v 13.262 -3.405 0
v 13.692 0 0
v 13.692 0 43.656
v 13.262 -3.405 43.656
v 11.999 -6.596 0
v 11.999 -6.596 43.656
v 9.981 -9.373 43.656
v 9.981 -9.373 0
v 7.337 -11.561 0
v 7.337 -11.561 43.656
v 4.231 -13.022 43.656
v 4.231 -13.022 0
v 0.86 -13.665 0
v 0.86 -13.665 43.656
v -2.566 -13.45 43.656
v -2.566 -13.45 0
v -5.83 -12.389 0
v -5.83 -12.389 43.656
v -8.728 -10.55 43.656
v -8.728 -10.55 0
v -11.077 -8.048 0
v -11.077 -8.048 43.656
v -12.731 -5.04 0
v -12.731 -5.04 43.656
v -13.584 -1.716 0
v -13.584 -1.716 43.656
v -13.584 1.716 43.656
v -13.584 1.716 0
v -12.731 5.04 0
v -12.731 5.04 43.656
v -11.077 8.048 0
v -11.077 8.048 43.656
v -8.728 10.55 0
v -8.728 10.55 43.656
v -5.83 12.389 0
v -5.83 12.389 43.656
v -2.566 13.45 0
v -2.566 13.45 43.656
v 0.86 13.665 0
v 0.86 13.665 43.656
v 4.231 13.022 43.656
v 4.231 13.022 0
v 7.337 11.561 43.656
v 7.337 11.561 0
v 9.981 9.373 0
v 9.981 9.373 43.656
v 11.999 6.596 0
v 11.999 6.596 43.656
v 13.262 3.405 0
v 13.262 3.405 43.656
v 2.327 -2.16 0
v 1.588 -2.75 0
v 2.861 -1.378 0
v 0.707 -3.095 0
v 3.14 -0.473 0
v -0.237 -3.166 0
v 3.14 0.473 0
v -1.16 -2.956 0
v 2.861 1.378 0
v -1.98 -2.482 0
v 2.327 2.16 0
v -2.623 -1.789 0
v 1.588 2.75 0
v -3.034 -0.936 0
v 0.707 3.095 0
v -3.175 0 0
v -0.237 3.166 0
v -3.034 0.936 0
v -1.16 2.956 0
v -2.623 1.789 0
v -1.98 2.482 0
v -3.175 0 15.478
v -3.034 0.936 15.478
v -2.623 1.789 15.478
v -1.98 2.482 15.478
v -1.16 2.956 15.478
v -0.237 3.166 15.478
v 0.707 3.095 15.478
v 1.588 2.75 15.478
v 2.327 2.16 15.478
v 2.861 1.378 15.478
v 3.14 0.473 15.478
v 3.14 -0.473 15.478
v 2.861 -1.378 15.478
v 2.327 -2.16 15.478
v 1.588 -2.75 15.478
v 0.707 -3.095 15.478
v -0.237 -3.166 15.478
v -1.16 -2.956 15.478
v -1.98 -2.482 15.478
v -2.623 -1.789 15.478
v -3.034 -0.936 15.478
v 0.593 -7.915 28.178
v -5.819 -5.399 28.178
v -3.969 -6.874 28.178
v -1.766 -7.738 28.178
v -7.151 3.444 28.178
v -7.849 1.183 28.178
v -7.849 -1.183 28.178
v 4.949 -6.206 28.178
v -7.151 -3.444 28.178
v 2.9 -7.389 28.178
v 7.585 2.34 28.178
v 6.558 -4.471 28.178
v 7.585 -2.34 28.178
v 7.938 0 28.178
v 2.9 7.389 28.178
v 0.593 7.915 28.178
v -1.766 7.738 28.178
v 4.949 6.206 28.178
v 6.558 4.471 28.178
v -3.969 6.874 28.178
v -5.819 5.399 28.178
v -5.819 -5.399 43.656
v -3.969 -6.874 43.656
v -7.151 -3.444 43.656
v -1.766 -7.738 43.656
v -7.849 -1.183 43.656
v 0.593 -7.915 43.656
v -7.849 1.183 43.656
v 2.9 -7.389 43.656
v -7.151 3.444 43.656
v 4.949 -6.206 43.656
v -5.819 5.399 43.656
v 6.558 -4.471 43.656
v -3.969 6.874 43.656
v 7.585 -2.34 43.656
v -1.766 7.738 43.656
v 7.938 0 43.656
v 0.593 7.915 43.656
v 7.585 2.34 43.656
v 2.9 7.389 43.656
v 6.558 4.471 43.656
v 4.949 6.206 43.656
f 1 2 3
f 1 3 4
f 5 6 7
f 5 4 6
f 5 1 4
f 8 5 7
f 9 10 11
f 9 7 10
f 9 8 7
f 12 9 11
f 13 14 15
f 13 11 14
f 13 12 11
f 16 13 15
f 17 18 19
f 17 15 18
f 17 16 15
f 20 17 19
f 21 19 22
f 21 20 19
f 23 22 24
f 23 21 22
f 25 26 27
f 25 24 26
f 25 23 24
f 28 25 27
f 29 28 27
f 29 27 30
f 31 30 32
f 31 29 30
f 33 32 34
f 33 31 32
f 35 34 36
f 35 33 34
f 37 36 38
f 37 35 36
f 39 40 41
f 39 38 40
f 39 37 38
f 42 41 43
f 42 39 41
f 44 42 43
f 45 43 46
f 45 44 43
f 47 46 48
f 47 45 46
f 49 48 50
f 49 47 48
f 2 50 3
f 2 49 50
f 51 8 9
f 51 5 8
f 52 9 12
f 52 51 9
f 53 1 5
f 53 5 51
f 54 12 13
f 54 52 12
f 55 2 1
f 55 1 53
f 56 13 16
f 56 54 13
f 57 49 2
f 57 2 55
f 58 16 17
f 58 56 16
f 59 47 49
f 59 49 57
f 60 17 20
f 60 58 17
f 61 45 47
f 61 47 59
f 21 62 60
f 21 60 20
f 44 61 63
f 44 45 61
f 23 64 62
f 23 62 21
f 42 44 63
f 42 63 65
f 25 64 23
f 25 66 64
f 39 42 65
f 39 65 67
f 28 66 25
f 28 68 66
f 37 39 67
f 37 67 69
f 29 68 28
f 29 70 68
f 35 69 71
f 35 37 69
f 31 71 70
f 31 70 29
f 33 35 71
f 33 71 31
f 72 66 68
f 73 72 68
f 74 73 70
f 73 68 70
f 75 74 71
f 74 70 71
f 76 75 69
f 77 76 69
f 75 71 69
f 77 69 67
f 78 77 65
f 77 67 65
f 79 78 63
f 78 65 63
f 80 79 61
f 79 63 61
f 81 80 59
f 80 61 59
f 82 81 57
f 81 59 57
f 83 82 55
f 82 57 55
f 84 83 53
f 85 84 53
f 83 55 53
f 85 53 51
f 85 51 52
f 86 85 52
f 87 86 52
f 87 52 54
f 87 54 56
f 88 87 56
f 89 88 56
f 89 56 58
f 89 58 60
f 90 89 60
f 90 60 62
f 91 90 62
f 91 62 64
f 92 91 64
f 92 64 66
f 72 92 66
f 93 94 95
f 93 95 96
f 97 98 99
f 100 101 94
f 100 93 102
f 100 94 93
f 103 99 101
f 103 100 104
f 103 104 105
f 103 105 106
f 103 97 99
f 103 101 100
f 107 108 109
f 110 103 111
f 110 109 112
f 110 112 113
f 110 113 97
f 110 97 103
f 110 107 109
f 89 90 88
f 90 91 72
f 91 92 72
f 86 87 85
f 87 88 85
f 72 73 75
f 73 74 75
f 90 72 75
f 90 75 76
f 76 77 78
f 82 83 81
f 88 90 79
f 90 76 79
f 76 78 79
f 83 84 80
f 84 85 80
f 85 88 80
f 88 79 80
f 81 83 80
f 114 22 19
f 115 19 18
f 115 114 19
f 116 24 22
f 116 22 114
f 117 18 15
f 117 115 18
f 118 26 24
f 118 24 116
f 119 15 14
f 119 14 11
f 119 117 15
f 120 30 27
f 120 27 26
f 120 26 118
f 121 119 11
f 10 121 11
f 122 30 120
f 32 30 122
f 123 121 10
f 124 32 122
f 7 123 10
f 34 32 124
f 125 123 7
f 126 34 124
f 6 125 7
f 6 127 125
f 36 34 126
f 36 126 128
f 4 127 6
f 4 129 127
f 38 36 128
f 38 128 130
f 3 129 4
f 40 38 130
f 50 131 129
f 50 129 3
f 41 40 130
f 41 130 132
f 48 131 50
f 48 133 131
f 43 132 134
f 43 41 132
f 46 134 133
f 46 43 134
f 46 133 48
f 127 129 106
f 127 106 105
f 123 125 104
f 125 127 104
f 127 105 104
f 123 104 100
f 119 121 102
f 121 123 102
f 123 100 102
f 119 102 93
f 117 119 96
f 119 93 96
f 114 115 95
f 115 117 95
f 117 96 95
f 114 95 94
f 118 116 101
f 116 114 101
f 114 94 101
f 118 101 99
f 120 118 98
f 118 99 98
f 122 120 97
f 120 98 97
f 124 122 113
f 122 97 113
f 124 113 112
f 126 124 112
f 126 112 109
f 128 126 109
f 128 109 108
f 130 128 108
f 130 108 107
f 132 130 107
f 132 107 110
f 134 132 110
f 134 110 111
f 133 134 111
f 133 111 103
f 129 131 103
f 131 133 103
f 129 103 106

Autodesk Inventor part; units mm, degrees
ref_plane "YZ Plane" through (0, 0, 0) normal (1, 0, 0) x (0, 1, 0)
ref_plane "XZ Plane" through (0, 0, 0) normal (0, 1, 0) x (-1, 0, 0)
ref_plane "XY Plane" through (0, 0, 0) normal (0, 0, 1) x (1, 0, 0)
sketch "Sketch1" plane through (0, 0, 0) normal (0, 0, 1) x (1, 0, 0)
  circle A0 centre (0, 0) radius 7.9375
  circle A1 centre (0, 0) radius 13.6922
  dimension "d0" = 15.875
  dimension "d1" = 27.3844
extrude "Extrusion1" add sketch "Sketch1" along normal blind 43.6562
ref_plane "Work Plane1" through (0, 0, 21.8281) normal (0, 0, 1) x (1, 0, 0)
sketch "Sketch3" plane through (0, 0, 21.8281) normal (0, 0, 1) x (1, 0, 0)
  circle A0 centre (0, 0) radius 7.9375 projected
extrude "Extrusion2" add sketch "Sketch3" along normal mid plane 12.7
sketch "Sketch5" plane through (0, 0, 0) normal (0, 0, -1) x (-1, 0, 0)
  circle A0 centre (0, 0) radius 3.175
  circle A1 centre (0, 0) radius 13.6922 projected
  circle A2 centre (0, 0) radius 7.9375 projected
  dimension "d6" = 6.35
extrude "Extrusion3" add sketch "Sketch5" against normal up to surface (15.4781 mm away) contours A2
properties part number "Machinable Bore Flexible Shaft Coupling"
